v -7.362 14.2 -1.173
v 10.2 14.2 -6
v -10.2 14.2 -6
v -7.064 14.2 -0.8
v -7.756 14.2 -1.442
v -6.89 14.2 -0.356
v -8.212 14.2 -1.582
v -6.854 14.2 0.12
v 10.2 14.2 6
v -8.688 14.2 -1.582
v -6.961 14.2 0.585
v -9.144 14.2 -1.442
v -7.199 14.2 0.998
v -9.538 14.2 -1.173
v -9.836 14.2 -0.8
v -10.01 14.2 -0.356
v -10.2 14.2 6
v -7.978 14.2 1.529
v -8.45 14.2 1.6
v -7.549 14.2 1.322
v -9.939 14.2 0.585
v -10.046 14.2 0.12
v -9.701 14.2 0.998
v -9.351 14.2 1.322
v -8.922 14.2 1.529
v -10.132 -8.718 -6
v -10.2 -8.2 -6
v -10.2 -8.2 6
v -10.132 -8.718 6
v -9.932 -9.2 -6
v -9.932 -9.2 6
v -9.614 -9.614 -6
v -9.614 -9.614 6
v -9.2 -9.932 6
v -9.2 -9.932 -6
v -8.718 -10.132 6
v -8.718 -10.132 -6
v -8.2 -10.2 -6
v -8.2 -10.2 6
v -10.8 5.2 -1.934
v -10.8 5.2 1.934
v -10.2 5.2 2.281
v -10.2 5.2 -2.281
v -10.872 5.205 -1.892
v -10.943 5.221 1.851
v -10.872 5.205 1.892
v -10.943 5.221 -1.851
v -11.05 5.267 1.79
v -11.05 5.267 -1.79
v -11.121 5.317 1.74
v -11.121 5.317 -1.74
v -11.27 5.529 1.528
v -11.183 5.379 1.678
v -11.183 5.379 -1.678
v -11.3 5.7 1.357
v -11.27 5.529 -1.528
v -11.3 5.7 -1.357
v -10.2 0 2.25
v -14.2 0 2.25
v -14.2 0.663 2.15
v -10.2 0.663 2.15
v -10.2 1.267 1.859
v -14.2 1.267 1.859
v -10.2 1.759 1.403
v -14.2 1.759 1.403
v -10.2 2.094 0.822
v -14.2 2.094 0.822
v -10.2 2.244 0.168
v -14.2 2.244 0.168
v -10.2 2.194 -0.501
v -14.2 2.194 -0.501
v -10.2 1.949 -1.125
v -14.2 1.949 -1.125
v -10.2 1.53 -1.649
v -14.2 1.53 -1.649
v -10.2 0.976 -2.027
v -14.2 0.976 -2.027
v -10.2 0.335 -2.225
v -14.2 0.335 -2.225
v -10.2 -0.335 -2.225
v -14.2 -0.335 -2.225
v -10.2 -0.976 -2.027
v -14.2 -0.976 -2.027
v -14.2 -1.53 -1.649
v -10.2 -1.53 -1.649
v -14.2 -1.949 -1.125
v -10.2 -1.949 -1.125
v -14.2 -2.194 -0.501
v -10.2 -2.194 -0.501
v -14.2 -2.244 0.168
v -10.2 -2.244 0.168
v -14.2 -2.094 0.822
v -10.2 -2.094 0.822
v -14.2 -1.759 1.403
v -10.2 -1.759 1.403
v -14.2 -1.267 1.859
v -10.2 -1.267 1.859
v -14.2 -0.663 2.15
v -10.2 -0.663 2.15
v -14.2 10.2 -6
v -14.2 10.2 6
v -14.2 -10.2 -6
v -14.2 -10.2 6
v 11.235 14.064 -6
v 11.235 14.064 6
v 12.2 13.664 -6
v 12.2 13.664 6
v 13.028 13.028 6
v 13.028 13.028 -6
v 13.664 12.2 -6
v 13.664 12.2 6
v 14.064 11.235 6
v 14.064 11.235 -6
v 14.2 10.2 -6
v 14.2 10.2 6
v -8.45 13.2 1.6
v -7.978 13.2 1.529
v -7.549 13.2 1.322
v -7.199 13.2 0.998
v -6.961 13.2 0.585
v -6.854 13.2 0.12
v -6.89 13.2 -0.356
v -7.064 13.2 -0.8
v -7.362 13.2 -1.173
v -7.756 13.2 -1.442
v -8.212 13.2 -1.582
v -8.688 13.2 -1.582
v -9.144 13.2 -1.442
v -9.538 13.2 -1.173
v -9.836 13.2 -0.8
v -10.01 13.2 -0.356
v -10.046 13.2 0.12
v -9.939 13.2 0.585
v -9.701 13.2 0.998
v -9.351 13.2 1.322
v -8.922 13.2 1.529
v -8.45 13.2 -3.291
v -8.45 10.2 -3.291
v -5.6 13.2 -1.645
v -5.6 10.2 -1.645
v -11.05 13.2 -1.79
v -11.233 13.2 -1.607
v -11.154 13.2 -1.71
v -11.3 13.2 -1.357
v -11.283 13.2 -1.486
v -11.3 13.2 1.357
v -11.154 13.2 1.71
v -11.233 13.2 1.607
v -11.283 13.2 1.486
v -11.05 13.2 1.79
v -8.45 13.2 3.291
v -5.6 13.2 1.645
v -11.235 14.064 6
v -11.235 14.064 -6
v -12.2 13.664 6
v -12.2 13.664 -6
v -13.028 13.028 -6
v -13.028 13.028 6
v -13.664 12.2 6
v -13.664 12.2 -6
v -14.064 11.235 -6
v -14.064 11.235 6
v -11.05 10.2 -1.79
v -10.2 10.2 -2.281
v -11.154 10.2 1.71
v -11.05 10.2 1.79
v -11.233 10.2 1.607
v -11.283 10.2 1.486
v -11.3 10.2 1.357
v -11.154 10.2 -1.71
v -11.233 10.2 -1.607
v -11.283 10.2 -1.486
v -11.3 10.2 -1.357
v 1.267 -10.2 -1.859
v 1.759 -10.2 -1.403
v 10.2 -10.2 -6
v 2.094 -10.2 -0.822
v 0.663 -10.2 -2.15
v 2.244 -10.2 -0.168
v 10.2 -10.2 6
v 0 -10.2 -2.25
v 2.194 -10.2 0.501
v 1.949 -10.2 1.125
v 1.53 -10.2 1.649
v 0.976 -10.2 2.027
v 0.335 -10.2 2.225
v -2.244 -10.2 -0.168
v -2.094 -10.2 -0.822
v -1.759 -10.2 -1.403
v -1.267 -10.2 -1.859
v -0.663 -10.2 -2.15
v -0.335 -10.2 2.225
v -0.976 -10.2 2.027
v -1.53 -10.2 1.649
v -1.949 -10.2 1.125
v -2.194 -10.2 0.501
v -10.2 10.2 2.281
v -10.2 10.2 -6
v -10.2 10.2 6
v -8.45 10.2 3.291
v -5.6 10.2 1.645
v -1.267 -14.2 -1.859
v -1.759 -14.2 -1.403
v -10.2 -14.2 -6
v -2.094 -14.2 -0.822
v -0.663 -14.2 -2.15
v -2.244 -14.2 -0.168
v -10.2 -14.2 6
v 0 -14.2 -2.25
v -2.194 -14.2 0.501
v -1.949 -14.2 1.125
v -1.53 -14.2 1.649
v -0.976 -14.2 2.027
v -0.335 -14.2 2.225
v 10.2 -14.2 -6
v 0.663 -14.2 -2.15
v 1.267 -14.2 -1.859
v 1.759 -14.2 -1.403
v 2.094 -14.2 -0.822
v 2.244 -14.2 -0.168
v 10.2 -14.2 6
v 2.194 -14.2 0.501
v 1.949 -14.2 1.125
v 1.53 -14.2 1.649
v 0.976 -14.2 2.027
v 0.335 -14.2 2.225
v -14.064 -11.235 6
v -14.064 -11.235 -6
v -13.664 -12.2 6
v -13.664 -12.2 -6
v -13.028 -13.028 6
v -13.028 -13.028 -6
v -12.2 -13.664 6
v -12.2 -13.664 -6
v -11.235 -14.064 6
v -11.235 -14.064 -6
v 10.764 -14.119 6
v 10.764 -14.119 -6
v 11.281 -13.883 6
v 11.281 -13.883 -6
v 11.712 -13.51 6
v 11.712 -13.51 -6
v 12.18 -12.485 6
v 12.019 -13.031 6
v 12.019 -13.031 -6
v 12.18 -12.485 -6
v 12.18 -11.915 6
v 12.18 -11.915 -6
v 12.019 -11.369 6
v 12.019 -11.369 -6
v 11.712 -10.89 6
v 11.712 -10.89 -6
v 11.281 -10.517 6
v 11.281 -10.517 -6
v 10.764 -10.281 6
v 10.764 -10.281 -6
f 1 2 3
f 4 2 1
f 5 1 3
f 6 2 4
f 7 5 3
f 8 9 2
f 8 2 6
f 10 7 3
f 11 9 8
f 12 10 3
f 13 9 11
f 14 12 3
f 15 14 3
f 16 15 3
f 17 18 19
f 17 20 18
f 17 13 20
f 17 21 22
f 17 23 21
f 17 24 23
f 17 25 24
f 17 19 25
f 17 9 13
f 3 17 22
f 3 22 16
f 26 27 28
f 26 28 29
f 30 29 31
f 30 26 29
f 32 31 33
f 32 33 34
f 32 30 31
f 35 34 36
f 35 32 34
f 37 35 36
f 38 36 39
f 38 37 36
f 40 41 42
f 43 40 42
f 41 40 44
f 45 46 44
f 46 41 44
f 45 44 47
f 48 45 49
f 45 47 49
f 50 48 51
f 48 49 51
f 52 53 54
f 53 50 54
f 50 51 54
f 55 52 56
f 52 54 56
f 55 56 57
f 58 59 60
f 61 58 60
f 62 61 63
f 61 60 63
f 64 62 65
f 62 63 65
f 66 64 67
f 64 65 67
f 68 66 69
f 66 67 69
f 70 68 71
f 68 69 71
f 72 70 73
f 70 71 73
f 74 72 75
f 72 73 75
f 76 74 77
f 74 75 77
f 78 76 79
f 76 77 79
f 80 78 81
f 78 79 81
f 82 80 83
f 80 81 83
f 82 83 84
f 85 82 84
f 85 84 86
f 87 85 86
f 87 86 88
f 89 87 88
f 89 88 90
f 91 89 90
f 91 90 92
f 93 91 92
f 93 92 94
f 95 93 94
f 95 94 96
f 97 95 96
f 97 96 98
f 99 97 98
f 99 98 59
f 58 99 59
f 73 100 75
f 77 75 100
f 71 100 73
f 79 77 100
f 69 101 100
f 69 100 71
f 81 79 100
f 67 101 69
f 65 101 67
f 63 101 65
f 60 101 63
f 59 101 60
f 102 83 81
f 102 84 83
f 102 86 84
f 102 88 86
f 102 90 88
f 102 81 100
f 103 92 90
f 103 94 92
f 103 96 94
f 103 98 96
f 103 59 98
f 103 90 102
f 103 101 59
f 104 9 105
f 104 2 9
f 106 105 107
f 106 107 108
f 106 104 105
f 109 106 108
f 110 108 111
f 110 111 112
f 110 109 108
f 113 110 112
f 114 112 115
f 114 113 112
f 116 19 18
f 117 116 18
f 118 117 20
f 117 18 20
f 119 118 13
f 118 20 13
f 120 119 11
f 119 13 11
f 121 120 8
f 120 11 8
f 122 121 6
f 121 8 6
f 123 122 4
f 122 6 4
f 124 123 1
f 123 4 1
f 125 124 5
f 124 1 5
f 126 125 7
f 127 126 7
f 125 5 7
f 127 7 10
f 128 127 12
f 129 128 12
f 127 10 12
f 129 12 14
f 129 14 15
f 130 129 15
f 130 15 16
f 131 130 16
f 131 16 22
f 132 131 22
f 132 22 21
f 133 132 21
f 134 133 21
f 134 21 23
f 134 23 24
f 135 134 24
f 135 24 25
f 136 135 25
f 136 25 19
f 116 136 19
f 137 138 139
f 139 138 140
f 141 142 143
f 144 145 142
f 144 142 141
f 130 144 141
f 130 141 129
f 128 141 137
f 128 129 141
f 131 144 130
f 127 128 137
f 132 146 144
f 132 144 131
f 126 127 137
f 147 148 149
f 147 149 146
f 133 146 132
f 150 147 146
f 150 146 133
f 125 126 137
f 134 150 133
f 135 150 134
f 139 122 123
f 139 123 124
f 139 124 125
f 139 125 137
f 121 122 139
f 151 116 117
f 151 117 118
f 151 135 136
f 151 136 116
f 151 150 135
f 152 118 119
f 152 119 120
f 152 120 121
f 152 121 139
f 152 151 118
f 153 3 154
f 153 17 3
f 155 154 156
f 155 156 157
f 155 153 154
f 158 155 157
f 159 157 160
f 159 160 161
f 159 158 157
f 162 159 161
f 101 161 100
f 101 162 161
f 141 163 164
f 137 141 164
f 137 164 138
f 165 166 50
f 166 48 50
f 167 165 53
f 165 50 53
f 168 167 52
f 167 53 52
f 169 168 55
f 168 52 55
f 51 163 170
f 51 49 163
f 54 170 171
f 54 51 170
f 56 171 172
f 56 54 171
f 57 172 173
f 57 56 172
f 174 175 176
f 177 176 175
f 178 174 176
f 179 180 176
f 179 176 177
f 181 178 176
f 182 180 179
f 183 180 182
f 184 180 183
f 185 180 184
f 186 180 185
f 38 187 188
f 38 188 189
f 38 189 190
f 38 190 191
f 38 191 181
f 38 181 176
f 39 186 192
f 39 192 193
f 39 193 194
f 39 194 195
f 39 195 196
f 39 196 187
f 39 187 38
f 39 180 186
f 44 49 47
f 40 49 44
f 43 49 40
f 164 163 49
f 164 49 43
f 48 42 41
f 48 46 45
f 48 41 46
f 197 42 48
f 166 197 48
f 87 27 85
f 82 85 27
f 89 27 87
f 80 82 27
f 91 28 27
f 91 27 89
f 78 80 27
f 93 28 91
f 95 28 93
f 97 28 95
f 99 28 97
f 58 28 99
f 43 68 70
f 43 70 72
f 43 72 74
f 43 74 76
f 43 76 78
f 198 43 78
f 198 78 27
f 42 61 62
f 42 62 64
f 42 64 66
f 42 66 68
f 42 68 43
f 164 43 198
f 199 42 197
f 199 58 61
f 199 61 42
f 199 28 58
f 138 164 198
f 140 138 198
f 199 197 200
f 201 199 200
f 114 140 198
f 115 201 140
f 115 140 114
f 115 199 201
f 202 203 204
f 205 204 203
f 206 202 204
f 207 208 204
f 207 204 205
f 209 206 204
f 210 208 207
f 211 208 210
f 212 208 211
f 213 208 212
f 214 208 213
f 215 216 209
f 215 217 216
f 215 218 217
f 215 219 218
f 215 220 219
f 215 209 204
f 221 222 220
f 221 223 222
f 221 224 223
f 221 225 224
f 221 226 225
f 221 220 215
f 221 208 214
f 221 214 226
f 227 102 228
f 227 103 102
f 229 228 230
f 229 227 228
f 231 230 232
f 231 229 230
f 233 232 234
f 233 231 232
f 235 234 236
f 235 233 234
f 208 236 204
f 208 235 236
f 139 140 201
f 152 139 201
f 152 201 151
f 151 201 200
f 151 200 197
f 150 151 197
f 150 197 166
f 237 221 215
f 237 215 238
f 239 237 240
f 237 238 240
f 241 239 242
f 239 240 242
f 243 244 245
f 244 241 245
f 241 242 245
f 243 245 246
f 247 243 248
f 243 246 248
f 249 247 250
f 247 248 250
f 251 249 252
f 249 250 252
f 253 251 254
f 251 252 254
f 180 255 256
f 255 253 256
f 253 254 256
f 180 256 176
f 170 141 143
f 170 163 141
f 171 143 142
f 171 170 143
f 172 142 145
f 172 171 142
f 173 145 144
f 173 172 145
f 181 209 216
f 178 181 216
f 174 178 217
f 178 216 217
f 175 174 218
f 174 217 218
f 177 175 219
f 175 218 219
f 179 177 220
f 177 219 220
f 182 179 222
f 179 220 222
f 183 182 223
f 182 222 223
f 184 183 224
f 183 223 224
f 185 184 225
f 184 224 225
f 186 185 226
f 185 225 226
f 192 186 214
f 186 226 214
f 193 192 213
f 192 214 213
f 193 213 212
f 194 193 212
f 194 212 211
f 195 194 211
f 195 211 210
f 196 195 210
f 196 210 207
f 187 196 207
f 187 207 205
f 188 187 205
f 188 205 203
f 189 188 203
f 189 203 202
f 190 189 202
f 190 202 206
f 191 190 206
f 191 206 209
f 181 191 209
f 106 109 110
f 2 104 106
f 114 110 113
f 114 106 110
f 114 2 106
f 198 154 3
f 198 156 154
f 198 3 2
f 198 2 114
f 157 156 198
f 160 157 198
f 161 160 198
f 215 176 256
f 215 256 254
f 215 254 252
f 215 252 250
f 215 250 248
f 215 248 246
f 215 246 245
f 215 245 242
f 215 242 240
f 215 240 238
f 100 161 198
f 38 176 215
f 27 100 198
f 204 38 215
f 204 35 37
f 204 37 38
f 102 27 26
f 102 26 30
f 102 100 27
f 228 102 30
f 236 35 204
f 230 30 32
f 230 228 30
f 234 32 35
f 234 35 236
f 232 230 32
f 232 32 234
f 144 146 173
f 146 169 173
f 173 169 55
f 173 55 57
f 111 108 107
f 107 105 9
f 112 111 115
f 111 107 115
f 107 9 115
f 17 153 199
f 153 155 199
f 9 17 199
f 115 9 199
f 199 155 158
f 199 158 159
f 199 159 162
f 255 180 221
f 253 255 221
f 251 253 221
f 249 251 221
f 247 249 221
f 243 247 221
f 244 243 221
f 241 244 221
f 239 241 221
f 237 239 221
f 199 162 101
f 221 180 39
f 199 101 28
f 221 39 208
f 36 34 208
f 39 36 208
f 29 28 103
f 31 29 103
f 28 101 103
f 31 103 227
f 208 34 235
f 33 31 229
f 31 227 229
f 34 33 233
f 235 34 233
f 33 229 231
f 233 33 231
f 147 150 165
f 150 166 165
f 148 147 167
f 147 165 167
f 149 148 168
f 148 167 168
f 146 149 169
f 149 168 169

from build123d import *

# Parameters (mm, degrees)
RESSALTO_EXTRUS_O1_DEPTH = 6
ESBO_O3_R                = 1.6
CORTE_EXTRUS_O1_DEPTH    = 4
CORTE_EXTRUS_O2_DEPTH    = 3
CORTE_EXTRUS_O3_DEPTH    = 5
FILETE1_R                = 0.5
FILETE2_R                = 4
FILETE3_R                = 2
ESBO_O6_R                = 2.25
CORTE_EXTRUS_O4_DEPTH    = 10
ESBO_O7_R                = 2.25
CORTE_EXTRUS_O5_DEPTH    = 10


# Some blends are built 0.0001 mm under size
with BuildPart() as part:
    # Esboço1 → Ressalto-extrusão1 (new, symmetric)
    with BuildSketch(Plane.XY):
        Polygon((14.2, 14.2), (-14.2, 14.2), (-14.2, -14.2), (14.2, -14.2), (14.2, -10.2), (10.2, -10.2), (-10.2, -10.2), (-10.2, 10.2), (10.2, 10.2), (14.2, 10.2), align=None)
    extrude(amount=RESSALTO_EXTRUS_O1_DEPTH, both=True)

    # Esboço3 → Corte-extrusão1 (cut)
    with BuildSketch(Plane(origin=(0, 14.2, 0), x_dir=(1, 0, 0), z_dir=(0, 1, 0))):
        with Locations(Location((-8.45, 0, 0), (0, 0, 270))):
            Circle(ESBO_O3_R)
    extrude(amount=-CORTE_EXTRUS_O1_DEPTH, mode=Mode.SUBTRACT)

    # Esboço4 → Corte-extrusão2 (cut)
    with BuildSketch(Plane.XZ.offset(-10.2)):
        Polygon((-8.45, 3.290896534), (-11.3, 1.645448267), (-11.3, -1.645448267), (-8.45, -3.290896534), (-5.6, -1.645448267), (-5.6, 1.645448267), align=None)
    extrude(amount=-CORTE_EXTRUS_O2_DEPTH, mode=Mode.SUBTRACT)

    # Esboço5 → Corte-extrusão3 (cut)
    with BuildSketch(Plane.XZ.offset(-10.2)):
        Polygon((-11.3, -1.645448267), (-10.2, -2.280533563), (-8.45, -3.290896534), (-5.6, -1.645448267), (-5.6, 1.645448267), (-8.45, 3.290896534), (-10.2, 2.280533563), (-11.3, 1.645448267), align=None)
    extrude(amount=CORTE_EXTRUS_O3_DEPTH, mode=Mode.SUBTRACT)

    # Filete1
    filete1_edges = [part.edges().sort_by_distance(p)[0] for p in [
        (-11.3, 9.2, -1.645448267),
        (-11.3, 9.2, 1.645448267),
        (-11.3, 5.2, 0),
    ]]
    fillet(filete1_edges, radius=FILETE1_R)

    # Filete2
    filete2_edges = [part.edges().sort_by_distance(p)[0] for p in [
        (-14.2, -14.2, 0),
        (-14.2, 14.2, 0),
        (14.2, 14.2, 0),
        (14.2, -14.2, 0),
    ]]
    fillet(filete2_edges, radius=FILETE2_R - 0.0001)  # a hair under: the kernel refuses the full size

    # Filete3
    # the kernel refuses this fillet: 2 mm, written as the material it adds along each edge
    with BuildSketch(Plane(origin=(-10.2, -10.2, -6), x_dir=(0, 1, 0), z_dir=(0, 0, 1))) as filete3_piece_1:
        with BuildLine():
            CenterArc((FILETE3_R, -FILETE3_R), FILETE3_R, 90, 90)
            Line((0, -FILETE3_R), (0, 0))
            Line((0, 0), (FILETE3_R, 0))
        make_face()
    extrude(amount=12)
    # the kernel refuses this fillet: 2 mm, written as the material it takes off along each edge
    with BuildSketch(Plane(origin=(14.2, -10.2, -20.141946005), x_dir=(-1, 0, 0), z_dir=(0, 0, 1))) as filete3_2_piece_1:
        with BuildLine():
            CenterArc((3.999896367, 2), FILETE3_R, 90.000104073, 179.999895927)
            Line((3.999892734, 4), (3.999892371, 4.2))
            ThreePointArc((3.999892371, 4.2), (-0.2, 0.0001), (-0.2, 0))
            Line((-0.2, 0), (0, -0.2))
            Line((0, -0.2), (3.999896367, -0.2))
            Line((3.999896367, -0.2), (3.999896367, 0))
        make_face()
    extrude(amount=40.283892009, mode=Mode.SUBTRACT)

    # Esboço6 → Corte-extrusão4 (cut)
    with BuildSketch(Plane.ZY.offset(14.2)):
        Circle(ESBO_O6_R)
    extrude(amount=-CORTE_EXTRUS_O4_DEPTH, mode=Mode.SUBTRACT)

    # Esboço7 → Corte-extrusão5 (cut)
    with BuildSketch(Plane.XZ.offset(14.2)):
        with Locations(Location((0, 0, 0), (0, 0, 270))):
            Circle(ESBO_O7_R)
    extrude(amount=-CORTE_EXTRUS_O5_DEPTH, mode=Mode.SUBTRACT)


solid = part.part
